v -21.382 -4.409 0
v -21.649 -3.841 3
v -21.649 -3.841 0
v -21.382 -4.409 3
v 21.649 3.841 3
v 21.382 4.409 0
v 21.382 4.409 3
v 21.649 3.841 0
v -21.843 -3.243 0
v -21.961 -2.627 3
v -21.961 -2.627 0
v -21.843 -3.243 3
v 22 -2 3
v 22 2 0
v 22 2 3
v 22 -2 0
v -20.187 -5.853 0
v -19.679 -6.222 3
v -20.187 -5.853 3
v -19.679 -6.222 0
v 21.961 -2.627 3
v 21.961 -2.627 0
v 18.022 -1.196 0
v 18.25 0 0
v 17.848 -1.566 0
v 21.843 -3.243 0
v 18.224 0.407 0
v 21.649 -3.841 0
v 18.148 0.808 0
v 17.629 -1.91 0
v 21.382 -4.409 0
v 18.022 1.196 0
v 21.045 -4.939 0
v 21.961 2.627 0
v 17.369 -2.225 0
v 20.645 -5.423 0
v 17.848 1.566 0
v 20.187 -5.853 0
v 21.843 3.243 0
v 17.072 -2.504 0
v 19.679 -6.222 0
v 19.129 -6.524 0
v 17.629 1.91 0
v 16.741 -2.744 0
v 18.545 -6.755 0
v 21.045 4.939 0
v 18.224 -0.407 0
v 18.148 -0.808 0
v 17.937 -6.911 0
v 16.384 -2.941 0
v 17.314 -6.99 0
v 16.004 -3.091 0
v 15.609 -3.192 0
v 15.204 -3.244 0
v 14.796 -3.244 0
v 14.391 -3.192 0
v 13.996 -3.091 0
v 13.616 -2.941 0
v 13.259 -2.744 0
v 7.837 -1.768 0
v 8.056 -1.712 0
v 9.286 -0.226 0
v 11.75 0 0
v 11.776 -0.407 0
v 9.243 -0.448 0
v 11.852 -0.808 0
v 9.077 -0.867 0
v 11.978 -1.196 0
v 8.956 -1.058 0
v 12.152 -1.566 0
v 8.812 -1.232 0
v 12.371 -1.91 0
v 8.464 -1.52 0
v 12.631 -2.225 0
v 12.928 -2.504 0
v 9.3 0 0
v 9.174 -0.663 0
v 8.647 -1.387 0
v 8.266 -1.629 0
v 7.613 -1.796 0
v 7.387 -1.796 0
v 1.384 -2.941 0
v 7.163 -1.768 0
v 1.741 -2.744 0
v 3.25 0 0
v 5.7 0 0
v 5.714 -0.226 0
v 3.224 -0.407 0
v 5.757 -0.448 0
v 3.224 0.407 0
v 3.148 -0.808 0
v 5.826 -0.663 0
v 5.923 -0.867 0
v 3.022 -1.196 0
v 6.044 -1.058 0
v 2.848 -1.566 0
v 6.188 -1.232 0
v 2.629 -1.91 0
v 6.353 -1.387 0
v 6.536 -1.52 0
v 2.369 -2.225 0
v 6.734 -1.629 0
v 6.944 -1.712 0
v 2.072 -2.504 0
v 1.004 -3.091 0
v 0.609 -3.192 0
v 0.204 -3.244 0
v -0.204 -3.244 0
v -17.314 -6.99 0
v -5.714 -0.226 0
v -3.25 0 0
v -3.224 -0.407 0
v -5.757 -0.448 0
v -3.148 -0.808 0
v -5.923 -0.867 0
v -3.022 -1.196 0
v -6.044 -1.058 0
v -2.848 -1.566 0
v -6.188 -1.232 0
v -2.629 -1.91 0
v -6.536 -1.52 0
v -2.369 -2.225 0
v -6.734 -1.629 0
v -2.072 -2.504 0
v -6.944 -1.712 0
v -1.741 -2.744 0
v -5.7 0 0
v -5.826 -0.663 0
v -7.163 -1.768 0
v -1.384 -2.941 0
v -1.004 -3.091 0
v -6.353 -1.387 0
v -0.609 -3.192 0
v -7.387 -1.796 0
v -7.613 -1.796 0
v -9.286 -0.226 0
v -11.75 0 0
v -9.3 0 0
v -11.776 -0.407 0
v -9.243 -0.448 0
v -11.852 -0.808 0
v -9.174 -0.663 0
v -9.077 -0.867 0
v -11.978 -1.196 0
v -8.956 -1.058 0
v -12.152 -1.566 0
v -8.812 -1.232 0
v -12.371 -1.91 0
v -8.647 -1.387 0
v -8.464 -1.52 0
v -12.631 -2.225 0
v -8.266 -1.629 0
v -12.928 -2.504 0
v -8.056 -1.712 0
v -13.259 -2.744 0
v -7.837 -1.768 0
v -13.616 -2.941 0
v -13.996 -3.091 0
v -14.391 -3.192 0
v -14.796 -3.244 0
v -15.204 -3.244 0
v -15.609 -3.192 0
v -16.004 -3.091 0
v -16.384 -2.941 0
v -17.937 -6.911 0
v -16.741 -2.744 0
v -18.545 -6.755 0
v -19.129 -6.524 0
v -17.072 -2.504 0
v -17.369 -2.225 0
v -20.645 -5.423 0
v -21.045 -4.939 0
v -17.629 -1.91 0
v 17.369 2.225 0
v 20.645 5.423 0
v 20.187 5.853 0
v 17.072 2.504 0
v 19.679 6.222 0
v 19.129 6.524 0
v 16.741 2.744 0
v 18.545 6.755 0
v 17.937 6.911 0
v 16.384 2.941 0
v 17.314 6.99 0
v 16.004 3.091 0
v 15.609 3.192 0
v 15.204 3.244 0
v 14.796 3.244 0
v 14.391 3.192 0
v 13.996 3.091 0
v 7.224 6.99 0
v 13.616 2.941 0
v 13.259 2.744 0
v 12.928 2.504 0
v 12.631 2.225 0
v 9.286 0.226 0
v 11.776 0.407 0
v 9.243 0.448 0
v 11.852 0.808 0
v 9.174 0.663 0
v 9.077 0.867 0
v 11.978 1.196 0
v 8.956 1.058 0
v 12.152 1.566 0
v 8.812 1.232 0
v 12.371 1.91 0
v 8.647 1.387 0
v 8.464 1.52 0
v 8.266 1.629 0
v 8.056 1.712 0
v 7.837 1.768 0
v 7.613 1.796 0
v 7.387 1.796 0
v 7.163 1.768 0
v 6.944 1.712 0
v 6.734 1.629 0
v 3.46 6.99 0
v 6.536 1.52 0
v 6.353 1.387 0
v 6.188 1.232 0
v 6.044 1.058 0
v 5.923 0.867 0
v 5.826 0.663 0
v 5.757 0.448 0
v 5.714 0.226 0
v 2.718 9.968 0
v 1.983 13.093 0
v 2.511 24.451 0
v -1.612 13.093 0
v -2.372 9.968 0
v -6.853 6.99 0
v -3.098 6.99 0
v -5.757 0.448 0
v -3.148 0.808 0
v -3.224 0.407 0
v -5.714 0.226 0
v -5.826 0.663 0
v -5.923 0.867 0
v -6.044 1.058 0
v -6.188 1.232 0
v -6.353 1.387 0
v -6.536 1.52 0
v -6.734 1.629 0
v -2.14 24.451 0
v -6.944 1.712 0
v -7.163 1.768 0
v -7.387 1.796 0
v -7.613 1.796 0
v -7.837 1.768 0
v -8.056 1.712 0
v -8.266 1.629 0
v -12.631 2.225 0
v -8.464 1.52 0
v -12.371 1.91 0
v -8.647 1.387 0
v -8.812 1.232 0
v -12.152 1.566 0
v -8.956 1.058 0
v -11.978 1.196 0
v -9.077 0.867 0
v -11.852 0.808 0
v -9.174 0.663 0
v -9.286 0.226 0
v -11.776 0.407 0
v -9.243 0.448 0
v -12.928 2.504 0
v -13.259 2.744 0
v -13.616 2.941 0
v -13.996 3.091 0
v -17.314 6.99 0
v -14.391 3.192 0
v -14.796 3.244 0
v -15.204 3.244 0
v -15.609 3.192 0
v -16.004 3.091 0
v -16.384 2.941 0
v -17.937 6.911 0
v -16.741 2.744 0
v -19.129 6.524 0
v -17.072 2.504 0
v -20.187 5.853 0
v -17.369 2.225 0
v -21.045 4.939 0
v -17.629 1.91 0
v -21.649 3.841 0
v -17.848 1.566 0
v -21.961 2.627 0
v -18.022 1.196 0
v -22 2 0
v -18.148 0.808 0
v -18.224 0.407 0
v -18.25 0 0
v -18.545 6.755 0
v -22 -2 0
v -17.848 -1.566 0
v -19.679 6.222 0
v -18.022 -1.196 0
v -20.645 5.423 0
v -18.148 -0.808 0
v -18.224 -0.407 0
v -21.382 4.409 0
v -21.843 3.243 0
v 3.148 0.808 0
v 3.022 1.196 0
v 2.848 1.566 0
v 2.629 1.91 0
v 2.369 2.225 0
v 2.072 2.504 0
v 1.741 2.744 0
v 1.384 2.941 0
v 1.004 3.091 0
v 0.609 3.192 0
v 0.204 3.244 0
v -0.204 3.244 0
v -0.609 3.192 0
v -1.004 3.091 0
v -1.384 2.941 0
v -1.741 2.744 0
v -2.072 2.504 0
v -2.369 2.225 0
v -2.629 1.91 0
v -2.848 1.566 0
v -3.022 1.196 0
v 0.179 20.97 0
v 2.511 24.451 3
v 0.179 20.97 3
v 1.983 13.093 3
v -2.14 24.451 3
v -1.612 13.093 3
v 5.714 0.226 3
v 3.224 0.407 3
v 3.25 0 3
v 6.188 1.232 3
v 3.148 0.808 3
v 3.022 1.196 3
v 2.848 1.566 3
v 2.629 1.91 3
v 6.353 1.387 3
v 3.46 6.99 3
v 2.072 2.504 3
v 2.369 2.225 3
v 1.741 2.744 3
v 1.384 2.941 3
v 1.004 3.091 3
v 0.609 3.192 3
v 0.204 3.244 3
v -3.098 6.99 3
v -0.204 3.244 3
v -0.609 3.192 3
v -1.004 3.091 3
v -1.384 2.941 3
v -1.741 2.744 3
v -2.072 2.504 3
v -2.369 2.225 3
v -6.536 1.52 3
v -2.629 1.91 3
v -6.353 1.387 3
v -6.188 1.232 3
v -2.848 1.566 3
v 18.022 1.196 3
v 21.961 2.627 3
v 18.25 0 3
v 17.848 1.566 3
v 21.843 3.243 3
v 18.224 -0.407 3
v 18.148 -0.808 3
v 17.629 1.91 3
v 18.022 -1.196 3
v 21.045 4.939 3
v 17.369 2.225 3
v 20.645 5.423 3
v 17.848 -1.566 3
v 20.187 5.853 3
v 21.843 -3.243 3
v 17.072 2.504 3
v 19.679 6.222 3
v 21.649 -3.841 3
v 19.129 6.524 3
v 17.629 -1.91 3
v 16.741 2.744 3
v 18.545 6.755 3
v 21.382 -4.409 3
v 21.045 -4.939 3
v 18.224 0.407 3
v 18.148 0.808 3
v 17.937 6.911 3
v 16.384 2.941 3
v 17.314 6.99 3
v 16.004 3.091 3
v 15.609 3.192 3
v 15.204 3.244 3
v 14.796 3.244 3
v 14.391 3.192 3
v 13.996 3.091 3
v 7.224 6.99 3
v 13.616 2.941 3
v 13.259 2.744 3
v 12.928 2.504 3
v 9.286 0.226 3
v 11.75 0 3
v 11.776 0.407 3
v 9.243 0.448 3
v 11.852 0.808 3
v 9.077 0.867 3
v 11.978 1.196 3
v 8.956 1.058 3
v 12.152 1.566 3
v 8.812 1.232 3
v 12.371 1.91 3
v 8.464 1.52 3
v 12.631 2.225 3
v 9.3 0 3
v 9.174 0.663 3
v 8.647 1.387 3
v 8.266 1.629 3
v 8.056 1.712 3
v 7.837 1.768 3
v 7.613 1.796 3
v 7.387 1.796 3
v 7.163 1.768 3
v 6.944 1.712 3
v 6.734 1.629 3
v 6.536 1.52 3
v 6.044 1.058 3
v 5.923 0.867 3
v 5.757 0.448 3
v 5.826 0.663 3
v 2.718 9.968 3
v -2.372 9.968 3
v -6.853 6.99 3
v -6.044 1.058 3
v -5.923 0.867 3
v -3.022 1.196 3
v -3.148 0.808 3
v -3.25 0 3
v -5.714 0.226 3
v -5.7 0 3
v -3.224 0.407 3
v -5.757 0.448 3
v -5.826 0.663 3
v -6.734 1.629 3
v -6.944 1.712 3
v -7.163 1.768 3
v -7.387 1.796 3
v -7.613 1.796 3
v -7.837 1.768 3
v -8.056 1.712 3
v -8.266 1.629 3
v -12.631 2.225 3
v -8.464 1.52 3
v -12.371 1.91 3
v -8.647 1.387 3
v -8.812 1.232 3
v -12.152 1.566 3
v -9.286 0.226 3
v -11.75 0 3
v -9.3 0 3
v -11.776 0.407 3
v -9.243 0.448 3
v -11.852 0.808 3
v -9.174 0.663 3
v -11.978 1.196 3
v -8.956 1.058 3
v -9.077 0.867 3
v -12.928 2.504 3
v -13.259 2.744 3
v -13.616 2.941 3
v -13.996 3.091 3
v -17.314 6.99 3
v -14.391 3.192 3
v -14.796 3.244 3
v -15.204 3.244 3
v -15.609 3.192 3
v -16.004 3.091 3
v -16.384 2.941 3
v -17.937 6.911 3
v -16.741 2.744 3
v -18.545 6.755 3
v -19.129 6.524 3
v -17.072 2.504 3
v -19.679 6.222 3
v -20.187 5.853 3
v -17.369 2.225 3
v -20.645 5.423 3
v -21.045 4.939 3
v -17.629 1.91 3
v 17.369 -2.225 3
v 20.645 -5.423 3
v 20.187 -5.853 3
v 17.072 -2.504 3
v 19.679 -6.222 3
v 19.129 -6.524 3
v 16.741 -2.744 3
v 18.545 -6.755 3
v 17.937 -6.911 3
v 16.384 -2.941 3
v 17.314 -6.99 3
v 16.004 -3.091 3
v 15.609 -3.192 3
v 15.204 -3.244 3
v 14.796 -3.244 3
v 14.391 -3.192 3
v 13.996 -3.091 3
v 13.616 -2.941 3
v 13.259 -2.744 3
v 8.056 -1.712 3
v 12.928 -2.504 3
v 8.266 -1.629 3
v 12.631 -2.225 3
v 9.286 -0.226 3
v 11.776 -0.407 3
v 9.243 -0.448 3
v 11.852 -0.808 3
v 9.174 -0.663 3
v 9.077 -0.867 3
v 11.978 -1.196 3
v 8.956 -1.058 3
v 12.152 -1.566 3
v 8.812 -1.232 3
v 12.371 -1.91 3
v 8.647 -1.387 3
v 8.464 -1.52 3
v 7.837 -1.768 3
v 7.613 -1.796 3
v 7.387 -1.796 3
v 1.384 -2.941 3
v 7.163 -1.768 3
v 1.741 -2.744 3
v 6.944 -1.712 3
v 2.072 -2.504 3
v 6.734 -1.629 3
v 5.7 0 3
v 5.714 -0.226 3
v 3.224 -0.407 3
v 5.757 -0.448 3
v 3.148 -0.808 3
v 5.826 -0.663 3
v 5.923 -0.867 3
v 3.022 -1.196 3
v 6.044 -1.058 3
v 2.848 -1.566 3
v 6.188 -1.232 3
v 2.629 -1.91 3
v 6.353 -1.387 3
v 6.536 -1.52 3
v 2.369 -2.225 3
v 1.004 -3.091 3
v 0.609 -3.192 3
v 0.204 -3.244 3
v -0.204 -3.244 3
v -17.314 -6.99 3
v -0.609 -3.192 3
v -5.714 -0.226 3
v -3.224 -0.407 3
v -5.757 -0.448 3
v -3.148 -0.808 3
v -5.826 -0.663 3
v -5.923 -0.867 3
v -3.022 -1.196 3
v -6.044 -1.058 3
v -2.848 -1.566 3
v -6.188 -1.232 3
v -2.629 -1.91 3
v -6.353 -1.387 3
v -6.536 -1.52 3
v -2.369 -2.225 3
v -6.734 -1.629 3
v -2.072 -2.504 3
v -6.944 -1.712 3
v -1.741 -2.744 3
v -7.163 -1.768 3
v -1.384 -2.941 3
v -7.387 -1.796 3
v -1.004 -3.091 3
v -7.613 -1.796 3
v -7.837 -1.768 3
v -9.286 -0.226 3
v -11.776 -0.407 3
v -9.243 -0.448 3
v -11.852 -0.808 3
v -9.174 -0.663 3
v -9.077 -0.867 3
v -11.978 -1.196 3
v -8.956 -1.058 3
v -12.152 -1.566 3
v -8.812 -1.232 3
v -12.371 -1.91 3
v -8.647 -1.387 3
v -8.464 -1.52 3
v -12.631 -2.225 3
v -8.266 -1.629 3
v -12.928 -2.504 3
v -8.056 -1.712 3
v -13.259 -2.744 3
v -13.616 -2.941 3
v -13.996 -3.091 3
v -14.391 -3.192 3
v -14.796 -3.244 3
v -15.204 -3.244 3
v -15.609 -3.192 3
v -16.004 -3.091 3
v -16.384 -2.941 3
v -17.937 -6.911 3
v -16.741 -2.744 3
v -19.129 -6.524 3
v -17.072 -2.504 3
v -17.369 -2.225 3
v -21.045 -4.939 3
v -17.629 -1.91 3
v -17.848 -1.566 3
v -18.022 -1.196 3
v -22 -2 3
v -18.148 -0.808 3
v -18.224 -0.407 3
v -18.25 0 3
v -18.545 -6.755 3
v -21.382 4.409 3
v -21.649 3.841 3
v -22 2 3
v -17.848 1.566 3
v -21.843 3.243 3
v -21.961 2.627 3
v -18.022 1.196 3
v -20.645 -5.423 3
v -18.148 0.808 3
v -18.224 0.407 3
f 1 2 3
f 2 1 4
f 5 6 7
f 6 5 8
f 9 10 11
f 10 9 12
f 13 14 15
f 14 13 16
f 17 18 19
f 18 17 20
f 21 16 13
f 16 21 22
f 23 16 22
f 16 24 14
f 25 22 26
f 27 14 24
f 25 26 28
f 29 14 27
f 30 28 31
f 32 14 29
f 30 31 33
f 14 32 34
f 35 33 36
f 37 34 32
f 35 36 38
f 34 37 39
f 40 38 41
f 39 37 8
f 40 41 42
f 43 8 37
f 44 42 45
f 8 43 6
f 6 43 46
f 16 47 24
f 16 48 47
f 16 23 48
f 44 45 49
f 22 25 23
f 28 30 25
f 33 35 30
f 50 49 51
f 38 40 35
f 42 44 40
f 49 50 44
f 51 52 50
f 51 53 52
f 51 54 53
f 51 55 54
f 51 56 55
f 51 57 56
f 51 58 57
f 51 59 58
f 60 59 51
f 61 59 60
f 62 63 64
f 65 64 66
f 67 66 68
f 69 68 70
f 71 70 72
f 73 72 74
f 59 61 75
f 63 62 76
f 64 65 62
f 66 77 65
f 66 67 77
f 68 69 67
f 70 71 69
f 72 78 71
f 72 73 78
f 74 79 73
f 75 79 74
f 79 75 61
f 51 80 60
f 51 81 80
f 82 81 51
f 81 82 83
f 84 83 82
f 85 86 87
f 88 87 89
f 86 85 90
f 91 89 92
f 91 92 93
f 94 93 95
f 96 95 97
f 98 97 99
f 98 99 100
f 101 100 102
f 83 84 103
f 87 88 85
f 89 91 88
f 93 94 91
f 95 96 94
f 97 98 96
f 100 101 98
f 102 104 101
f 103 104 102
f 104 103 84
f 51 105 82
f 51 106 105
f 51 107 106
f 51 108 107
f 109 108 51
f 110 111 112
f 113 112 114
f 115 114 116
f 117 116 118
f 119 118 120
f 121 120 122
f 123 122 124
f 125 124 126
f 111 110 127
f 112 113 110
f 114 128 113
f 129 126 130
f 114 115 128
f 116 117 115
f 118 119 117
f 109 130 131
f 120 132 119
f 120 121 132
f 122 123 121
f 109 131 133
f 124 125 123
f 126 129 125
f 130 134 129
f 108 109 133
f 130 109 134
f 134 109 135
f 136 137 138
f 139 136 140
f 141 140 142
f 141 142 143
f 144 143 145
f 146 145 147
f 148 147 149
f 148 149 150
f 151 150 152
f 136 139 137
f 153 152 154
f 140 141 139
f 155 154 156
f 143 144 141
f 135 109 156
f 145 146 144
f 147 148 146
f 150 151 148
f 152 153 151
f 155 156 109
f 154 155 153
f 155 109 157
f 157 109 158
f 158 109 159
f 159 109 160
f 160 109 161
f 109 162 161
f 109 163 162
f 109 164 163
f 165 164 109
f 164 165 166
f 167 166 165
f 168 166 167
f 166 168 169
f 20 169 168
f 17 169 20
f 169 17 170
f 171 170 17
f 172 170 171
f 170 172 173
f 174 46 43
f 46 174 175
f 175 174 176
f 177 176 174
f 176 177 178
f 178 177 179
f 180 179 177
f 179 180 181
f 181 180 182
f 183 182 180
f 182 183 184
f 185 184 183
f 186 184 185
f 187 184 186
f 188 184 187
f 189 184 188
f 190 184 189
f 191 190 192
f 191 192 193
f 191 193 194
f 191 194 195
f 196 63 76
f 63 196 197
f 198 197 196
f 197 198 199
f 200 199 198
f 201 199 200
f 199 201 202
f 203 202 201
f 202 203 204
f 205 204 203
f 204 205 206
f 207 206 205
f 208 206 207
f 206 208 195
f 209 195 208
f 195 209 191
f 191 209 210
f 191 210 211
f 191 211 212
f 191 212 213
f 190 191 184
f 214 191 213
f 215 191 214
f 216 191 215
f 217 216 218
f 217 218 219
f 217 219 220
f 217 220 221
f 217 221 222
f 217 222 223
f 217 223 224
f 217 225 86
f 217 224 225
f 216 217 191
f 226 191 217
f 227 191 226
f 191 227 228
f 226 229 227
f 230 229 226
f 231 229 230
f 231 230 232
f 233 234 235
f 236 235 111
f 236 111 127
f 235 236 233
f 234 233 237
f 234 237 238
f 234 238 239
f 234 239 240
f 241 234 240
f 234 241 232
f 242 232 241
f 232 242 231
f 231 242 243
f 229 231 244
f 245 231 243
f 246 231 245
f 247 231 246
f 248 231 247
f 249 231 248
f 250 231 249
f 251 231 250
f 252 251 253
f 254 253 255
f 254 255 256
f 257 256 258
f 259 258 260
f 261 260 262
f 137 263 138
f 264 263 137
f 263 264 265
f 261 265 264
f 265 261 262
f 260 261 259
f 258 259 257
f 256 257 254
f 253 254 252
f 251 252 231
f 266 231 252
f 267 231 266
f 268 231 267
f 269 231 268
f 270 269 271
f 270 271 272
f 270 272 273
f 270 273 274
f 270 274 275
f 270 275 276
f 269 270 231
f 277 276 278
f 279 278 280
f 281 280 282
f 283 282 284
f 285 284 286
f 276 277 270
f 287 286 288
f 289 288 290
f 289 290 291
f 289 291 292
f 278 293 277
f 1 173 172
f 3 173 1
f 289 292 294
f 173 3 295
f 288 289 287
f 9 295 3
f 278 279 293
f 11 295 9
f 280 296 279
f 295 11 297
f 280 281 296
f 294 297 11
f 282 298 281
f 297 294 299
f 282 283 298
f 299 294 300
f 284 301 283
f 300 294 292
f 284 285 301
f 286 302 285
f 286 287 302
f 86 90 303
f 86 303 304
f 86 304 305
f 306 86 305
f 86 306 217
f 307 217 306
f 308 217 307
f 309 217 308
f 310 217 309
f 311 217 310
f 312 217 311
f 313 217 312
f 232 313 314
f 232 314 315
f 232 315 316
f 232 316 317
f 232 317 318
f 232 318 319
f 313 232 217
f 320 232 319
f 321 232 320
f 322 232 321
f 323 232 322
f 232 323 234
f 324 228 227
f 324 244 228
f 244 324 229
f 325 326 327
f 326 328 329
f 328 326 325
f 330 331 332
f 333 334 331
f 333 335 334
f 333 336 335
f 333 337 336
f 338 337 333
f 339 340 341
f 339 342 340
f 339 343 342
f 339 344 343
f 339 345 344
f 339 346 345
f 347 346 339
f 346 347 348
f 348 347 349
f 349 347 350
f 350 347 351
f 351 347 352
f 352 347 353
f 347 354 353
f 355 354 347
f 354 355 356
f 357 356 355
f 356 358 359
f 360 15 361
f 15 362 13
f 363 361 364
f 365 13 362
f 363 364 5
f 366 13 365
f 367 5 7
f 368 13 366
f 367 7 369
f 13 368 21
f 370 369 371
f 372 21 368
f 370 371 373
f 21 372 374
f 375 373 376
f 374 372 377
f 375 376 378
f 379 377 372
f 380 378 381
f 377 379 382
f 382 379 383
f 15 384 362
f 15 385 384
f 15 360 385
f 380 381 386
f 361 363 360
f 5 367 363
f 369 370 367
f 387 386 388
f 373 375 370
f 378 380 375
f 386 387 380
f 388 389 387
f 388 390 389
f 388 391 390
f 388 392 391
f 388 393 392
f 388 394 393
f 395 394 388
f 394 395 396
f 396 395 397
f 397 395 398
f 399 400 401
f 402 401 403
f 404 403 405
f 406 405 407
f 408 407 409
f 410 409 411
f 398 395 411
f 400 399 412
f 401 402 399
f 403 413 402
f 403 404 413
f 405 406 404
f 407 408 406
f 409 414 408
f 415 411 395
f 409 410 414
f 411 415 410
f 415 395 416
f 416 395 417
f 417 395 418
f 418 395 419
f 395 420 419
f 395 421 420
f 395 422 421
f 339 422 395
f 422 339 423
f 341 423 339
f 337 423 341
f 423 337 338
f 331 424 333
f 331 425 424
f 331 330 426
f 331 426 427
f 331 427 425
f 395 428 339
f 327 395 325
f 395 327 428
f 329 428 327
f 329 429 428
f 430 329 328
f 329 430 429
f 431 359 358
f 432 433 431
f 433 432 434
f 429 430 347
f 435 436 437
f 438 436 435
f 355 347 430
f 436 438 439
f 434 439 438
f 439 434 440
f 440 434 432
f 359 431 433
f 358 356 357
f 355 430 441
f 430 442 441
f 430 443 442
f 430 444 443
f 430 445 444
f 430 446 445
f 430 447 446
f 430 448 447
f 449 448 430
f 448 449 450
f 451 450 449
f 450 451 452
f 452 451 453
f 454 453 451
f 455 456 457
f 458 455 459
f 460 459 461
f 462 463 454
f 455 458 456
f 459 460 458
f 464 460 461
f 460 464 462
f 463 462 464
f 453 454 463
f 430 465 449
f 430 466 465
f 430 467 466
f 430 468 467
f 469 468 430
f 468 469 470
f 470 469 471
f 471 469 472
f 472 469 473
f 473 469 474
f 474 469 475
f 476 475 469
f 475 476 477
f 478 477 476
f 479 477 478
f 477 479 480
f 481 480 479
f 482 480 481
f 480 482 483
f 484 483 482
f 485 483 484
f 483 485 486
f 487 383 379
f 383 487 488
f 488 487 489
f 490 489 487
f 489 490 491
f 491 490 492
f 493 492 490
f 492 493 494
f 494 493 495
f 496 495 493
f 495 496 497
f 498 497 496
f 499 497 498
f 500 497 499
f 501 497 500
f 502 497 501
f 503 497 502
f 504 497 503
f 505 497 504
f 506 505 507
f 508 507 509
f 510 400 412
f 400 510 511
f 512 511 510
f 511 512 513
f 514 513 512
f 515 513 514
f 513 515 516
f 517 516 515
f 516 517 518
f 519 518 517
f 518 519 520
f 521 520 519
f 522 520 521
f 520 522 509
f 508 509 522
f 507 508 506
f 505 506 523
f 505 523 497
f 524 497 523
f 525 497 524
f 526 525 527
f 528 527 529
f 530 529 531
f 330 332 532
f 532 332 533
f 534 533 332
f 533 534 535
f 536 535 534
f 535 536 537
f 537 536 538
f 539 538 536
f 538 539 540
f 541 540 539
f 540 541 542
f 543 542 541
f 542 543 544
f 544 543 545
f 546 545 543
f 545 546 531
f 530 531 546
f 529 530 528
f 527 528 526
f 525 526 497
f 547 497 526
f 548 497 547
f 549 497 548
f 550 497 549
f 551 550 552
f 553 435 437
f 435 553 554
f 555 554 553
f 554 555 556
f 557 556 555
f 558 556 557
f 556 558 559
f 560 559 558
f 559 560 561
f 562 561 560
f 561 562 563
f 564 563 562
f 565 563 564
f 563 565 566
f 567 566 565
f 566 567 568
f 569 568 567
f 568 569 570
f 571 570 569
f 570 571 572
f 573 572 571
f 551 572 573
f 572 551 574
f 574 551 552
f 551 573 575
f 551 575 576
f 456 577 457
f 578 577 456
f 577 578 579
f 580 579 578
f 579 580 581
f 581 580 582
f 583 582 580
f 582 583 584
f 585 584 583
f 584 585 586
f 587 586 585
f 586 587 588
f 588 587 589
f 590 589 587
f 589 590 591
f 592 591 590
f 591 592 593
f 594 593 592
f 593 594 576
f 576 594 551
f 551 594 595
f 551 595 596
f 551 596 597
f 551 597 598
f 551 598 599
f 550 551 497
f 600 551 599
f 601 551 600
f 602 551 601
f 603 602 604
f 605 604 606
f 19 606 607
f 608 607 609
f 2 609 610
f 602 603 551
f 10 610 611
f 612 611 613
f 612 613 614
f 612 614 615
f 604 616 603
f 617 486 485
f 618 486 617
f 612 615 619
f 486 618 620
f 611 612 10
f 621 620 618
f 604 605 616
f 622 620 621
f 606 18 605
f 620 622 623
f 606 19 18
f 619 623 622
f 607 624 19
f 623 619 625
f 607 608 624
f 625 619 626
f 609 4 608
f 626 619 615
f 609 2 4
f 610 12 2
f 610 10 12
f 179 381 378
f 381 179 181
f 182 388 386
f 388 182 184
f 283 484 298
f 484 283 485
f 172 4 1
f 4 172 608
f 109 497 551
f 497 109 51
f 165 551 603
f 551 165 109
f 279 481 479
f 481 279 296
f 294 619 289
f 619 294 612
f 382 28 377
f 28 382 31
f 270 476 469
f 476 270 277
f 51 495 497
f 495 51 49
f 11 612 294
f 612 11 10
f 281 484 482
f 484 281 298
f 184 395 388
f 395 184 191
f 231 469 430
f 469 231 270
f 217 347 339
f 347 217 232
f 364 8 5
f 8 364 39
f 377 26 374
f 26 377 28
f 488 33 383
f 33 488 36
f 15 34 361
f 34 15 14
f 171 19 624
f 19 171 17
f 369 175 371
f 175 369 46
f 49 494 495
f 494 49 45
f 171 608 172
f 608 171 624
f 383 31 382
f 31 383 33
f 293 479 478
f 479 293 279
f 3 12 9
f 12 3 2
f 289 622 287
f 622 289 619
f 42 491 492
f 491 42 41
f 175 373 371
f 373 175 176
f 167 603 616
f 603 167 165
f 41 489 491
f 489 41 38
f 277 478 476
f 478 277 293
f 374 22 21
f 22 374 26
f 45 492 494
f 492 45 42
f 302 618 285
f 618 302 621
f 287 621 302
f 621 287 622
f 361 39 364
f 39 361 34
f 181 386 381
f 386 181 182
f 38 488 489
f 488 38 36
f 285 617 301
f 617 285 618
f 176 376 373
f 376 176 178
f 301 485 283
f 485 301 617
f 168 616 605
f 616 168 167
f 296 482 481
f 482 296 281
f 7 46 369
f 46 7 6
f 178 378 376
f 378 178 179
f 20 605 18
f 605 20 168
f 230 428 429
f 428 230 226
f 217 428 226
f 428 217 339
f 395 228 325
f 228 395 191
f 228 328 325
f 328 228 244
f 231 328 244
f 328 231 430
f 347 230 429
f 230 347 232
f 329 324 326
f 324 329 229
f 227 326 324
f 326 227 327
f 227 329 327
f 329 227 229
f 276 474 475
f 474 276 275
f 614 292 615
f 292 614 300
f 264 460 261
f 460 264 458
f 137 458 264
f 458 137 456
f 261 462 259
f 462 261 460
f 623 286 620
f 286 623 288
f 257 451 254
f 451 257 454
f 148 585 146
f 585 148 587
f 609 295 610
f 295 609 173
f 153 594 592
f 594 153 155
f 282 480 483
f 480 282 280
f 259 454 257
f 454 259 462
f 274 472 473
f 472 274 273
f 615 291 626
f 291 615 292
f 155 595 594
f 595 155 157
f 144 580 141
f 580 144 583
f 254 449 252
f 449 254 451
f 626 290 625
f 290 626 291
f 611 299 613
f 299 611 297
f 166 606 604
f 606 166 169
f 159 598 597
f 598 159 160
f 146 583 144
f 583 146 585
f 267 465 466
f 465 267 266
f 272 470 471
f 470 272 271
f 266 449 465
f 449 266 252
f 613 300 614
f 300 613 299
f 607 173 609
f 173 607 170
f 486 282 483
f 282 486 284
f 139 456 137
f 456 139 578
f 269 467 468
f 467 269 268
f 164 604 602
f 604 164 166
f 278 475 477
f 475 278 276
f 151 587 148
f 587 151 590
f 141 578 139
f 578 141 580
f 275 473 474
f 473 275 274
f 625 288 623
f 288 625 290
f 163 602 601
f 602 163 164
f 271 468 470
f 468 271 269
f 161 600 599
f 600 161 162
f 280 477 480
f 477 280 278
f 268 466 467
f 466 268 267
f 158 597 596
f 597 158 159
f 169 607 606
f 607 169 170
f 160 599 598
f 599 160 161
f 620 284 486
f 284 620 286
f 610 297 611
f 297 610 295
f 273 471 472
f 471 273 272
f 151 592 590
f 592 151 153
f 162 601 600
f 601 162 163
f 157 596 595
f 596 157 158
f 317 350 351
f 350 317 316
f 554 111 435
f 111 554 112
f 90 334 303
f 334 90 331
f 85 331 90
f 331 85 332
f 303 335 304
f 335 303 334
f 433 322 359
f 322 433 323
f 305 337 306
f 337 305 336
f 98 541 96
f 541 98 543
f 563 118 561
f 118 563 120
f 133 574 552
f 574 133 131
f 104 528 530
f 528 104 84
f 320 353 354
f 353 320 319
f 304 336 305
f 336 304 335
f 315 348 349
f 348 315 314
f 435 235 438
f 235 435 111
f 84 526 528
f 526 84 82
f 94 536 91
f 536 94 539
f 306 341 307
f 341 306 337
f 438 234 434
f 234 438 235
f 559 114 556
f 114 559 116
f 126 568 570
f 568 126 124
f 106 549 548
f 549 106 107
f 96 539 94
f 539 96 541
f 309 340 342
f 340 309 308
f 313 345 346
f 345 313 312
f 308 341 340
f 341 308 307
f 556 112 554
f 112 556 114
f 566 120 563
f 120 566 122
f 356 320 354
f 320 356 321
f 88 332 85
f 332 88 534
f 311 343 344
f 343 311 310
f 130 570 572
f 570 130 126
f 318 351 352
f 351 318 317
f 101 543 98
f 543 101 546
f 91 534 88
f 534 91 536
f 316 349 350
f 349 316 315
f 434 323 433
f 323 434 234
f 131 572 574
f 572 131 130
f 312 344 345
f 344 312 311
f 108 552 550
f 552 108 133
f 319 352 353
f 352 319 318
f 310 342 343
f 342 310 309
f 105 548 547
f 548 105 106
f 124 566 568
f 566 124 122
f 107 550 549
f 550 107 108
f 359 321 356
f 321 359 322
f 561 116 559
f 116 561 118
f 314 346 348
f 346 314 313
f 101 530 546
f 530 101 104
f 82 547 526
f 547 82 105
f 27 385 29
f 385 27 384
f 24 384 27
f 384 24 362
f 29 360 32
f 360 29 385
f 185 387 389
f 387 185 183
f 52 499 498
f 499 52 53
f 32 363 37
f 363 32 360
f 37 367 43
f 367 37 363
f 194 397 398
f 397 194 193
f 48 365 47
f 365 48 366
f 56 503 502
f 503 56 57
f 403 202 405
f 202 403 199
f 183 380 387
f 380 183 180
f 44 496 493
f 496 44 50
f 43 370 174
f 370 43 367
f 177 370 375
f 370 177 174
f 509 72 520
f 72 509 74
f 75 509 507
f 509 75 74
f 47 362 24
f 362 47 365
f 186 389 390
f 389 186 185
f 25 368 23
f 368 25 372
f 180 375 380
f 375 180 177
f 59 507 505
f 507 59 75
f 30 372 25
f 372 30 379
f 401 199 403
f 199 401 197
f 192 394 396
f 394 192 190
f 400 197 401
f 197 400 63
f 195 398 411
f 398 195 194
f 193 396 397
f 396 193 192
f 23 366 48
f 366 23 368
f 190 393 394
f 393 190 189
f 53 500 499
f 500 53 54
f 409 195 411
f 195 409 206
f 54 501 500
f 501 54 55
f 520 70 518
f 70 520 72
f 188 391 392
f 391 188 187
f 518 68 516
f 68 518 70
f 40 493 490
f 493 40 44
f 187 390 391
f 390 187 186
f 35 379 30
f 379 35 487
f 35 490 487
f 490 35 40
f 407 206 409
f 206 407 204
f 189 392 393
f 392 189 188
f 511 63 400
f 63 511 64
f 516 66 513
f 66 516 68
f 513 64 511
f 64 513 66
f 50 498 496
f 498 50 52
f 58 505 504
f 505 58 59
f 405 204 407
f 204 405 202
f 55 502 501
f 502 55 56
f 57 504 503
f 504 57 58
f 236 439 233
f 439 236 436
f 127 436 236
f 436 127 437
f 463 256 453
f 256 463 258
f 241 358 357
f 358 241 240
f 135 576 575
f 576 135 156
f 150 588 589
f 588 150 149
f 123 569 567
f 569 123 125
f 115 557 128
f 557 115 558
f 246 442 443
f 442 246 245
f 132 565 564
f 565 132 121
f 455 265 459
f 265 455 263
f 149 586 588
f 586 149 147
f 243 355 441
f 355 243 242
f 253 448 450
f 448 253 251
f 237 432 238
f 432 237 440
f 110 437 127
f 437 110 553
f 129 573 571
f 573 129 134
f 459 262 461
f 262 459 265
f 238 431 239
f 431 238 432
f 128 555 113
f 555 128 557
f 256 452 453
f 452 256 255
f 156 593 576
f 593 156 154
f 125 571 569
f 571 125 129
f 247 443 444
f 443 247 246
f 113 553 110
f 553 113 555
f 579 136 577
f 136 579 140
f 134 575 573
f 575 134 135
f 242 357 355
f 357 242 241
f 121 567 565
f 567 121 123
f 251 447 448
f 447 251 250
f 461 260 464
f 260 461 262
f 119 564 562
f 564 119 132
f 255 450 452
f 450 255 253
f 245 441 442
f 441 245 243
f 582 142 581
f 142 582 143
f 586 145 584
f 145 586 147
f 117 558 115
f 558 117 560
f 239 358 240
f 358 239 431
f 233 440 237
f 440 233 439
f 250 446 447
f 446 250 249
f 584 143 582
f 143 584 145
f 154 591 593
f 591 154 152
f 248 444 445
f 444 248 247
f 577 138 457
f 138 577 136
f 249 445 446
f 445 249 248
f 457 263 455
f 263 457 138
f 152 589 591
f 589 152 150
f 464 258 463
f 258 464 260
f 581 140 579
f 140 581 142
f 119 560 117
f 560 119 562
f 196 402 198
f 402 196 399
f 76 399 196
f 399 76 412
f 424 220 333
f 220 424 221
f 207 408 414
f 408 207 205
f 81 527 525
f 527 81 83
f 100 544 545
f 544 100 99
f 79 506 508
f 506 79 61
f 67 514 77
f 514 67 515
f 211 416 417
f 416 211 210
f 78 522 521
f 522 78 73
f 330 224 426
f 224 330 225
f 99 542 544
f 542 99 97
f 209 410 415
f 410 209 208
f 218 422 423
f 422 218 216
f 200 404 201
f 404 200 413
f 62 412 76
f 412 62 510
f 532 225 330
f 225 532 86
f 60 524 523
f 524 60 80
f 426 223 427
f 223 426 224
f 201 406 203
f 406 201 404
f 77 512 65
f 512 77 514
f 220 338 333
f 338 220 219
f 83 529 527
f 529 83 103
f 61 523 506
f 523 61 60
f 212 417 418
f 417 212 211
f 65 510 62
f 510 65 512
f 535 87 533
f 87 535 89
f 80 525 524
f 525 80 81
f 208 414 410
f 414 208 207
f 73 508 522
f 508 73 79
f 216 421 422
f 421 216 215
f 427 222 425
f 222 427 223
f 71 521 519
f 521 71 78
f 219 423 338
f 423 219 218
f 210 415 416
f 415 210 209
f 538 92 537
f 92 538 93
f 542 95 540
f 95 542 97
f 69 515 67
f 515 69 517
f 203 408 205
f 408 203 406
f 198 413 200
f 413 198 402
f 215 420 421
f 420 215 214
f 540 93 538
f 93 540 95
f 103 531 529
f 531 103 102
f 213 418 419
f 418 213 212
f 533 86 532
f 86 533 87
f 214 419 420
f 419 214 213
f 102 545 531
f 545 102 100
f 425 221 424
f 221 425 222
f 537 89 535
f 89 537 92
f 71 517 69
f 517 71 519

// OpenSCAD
$fn = 50;


difference() {
	union() {
		hull() {
			translate(v = [-17.0000000000, 2.0000000000, 0]) {
				cylinder(h = 3, r = 5);
			}
			translate(v = [17.0000000000, 2.0000000000, 0]) {
				cylinder(h = 3, r = 5);
			}
			translate(v = [-17.0000000000, -2.0000000000, 0]) {
				cylinder(h = 3, r = 5);
			}
			translate(v = [17.0000000000, -2.0000000000, 0]) {
				cylinder(h = 3, r = 5);
			}
		}
		translate(v = [0, 24, 0]) {
			linear_extrude(height = 3) {
				text(font = "DejaVu Sans Mono:style=Bold", halign = "center", size = 19.0000000000, text = "A", valign = "top");
			}
		}
	}
	union() {
		translate(v = [-15.0000000000, 0.0000000000, 0]) {
			translate(v = [0, 0, -100]) {
				cylinder(h = 200, r = 3.2500000000);
			}
		}
		translate(v = [0, 0, -100]) {
			cylinder(h = 200, r = 3.2500000000);
		}
		translate(v = [15.0000000000, 0.0000000000, 0]) {
			translate(v = [0, 0, -100]) {
				cylinder(h = 200, r = 3.2500000000);
			}
		}
		translate(v = [-15.0000000000, 0.0000000000, 0]) {
			translate(v = [0, 0, -100]) {
				cylinder(h = 200, r = 1.8000000000);
			}
		}
		translate(v = [-7.5000000000, 0.0000000000, 0]) {
			translate(v = [0, 0, -100]) {
				cylinder(h = 200, r = 1.8000000000);
			}
		}
		translate(v = [0, 0, -100]) {
			cylinder(h = 200, r = 1.8000000000);
		}
		translate(v = [7.5000000000, 0.0000000000, 0]) {
			translate(v = [0, 0, -100]) {
				cylinder(h = 200, r = 1.8000000000);
			}
		}
		translate(v = [15.0000000000, 0.0000000000, 0]) {
			translate(v = [0, 0, -100]) {
				cylinder(h = 200, r = 1.8000000000);
			}
		}
	}
}
